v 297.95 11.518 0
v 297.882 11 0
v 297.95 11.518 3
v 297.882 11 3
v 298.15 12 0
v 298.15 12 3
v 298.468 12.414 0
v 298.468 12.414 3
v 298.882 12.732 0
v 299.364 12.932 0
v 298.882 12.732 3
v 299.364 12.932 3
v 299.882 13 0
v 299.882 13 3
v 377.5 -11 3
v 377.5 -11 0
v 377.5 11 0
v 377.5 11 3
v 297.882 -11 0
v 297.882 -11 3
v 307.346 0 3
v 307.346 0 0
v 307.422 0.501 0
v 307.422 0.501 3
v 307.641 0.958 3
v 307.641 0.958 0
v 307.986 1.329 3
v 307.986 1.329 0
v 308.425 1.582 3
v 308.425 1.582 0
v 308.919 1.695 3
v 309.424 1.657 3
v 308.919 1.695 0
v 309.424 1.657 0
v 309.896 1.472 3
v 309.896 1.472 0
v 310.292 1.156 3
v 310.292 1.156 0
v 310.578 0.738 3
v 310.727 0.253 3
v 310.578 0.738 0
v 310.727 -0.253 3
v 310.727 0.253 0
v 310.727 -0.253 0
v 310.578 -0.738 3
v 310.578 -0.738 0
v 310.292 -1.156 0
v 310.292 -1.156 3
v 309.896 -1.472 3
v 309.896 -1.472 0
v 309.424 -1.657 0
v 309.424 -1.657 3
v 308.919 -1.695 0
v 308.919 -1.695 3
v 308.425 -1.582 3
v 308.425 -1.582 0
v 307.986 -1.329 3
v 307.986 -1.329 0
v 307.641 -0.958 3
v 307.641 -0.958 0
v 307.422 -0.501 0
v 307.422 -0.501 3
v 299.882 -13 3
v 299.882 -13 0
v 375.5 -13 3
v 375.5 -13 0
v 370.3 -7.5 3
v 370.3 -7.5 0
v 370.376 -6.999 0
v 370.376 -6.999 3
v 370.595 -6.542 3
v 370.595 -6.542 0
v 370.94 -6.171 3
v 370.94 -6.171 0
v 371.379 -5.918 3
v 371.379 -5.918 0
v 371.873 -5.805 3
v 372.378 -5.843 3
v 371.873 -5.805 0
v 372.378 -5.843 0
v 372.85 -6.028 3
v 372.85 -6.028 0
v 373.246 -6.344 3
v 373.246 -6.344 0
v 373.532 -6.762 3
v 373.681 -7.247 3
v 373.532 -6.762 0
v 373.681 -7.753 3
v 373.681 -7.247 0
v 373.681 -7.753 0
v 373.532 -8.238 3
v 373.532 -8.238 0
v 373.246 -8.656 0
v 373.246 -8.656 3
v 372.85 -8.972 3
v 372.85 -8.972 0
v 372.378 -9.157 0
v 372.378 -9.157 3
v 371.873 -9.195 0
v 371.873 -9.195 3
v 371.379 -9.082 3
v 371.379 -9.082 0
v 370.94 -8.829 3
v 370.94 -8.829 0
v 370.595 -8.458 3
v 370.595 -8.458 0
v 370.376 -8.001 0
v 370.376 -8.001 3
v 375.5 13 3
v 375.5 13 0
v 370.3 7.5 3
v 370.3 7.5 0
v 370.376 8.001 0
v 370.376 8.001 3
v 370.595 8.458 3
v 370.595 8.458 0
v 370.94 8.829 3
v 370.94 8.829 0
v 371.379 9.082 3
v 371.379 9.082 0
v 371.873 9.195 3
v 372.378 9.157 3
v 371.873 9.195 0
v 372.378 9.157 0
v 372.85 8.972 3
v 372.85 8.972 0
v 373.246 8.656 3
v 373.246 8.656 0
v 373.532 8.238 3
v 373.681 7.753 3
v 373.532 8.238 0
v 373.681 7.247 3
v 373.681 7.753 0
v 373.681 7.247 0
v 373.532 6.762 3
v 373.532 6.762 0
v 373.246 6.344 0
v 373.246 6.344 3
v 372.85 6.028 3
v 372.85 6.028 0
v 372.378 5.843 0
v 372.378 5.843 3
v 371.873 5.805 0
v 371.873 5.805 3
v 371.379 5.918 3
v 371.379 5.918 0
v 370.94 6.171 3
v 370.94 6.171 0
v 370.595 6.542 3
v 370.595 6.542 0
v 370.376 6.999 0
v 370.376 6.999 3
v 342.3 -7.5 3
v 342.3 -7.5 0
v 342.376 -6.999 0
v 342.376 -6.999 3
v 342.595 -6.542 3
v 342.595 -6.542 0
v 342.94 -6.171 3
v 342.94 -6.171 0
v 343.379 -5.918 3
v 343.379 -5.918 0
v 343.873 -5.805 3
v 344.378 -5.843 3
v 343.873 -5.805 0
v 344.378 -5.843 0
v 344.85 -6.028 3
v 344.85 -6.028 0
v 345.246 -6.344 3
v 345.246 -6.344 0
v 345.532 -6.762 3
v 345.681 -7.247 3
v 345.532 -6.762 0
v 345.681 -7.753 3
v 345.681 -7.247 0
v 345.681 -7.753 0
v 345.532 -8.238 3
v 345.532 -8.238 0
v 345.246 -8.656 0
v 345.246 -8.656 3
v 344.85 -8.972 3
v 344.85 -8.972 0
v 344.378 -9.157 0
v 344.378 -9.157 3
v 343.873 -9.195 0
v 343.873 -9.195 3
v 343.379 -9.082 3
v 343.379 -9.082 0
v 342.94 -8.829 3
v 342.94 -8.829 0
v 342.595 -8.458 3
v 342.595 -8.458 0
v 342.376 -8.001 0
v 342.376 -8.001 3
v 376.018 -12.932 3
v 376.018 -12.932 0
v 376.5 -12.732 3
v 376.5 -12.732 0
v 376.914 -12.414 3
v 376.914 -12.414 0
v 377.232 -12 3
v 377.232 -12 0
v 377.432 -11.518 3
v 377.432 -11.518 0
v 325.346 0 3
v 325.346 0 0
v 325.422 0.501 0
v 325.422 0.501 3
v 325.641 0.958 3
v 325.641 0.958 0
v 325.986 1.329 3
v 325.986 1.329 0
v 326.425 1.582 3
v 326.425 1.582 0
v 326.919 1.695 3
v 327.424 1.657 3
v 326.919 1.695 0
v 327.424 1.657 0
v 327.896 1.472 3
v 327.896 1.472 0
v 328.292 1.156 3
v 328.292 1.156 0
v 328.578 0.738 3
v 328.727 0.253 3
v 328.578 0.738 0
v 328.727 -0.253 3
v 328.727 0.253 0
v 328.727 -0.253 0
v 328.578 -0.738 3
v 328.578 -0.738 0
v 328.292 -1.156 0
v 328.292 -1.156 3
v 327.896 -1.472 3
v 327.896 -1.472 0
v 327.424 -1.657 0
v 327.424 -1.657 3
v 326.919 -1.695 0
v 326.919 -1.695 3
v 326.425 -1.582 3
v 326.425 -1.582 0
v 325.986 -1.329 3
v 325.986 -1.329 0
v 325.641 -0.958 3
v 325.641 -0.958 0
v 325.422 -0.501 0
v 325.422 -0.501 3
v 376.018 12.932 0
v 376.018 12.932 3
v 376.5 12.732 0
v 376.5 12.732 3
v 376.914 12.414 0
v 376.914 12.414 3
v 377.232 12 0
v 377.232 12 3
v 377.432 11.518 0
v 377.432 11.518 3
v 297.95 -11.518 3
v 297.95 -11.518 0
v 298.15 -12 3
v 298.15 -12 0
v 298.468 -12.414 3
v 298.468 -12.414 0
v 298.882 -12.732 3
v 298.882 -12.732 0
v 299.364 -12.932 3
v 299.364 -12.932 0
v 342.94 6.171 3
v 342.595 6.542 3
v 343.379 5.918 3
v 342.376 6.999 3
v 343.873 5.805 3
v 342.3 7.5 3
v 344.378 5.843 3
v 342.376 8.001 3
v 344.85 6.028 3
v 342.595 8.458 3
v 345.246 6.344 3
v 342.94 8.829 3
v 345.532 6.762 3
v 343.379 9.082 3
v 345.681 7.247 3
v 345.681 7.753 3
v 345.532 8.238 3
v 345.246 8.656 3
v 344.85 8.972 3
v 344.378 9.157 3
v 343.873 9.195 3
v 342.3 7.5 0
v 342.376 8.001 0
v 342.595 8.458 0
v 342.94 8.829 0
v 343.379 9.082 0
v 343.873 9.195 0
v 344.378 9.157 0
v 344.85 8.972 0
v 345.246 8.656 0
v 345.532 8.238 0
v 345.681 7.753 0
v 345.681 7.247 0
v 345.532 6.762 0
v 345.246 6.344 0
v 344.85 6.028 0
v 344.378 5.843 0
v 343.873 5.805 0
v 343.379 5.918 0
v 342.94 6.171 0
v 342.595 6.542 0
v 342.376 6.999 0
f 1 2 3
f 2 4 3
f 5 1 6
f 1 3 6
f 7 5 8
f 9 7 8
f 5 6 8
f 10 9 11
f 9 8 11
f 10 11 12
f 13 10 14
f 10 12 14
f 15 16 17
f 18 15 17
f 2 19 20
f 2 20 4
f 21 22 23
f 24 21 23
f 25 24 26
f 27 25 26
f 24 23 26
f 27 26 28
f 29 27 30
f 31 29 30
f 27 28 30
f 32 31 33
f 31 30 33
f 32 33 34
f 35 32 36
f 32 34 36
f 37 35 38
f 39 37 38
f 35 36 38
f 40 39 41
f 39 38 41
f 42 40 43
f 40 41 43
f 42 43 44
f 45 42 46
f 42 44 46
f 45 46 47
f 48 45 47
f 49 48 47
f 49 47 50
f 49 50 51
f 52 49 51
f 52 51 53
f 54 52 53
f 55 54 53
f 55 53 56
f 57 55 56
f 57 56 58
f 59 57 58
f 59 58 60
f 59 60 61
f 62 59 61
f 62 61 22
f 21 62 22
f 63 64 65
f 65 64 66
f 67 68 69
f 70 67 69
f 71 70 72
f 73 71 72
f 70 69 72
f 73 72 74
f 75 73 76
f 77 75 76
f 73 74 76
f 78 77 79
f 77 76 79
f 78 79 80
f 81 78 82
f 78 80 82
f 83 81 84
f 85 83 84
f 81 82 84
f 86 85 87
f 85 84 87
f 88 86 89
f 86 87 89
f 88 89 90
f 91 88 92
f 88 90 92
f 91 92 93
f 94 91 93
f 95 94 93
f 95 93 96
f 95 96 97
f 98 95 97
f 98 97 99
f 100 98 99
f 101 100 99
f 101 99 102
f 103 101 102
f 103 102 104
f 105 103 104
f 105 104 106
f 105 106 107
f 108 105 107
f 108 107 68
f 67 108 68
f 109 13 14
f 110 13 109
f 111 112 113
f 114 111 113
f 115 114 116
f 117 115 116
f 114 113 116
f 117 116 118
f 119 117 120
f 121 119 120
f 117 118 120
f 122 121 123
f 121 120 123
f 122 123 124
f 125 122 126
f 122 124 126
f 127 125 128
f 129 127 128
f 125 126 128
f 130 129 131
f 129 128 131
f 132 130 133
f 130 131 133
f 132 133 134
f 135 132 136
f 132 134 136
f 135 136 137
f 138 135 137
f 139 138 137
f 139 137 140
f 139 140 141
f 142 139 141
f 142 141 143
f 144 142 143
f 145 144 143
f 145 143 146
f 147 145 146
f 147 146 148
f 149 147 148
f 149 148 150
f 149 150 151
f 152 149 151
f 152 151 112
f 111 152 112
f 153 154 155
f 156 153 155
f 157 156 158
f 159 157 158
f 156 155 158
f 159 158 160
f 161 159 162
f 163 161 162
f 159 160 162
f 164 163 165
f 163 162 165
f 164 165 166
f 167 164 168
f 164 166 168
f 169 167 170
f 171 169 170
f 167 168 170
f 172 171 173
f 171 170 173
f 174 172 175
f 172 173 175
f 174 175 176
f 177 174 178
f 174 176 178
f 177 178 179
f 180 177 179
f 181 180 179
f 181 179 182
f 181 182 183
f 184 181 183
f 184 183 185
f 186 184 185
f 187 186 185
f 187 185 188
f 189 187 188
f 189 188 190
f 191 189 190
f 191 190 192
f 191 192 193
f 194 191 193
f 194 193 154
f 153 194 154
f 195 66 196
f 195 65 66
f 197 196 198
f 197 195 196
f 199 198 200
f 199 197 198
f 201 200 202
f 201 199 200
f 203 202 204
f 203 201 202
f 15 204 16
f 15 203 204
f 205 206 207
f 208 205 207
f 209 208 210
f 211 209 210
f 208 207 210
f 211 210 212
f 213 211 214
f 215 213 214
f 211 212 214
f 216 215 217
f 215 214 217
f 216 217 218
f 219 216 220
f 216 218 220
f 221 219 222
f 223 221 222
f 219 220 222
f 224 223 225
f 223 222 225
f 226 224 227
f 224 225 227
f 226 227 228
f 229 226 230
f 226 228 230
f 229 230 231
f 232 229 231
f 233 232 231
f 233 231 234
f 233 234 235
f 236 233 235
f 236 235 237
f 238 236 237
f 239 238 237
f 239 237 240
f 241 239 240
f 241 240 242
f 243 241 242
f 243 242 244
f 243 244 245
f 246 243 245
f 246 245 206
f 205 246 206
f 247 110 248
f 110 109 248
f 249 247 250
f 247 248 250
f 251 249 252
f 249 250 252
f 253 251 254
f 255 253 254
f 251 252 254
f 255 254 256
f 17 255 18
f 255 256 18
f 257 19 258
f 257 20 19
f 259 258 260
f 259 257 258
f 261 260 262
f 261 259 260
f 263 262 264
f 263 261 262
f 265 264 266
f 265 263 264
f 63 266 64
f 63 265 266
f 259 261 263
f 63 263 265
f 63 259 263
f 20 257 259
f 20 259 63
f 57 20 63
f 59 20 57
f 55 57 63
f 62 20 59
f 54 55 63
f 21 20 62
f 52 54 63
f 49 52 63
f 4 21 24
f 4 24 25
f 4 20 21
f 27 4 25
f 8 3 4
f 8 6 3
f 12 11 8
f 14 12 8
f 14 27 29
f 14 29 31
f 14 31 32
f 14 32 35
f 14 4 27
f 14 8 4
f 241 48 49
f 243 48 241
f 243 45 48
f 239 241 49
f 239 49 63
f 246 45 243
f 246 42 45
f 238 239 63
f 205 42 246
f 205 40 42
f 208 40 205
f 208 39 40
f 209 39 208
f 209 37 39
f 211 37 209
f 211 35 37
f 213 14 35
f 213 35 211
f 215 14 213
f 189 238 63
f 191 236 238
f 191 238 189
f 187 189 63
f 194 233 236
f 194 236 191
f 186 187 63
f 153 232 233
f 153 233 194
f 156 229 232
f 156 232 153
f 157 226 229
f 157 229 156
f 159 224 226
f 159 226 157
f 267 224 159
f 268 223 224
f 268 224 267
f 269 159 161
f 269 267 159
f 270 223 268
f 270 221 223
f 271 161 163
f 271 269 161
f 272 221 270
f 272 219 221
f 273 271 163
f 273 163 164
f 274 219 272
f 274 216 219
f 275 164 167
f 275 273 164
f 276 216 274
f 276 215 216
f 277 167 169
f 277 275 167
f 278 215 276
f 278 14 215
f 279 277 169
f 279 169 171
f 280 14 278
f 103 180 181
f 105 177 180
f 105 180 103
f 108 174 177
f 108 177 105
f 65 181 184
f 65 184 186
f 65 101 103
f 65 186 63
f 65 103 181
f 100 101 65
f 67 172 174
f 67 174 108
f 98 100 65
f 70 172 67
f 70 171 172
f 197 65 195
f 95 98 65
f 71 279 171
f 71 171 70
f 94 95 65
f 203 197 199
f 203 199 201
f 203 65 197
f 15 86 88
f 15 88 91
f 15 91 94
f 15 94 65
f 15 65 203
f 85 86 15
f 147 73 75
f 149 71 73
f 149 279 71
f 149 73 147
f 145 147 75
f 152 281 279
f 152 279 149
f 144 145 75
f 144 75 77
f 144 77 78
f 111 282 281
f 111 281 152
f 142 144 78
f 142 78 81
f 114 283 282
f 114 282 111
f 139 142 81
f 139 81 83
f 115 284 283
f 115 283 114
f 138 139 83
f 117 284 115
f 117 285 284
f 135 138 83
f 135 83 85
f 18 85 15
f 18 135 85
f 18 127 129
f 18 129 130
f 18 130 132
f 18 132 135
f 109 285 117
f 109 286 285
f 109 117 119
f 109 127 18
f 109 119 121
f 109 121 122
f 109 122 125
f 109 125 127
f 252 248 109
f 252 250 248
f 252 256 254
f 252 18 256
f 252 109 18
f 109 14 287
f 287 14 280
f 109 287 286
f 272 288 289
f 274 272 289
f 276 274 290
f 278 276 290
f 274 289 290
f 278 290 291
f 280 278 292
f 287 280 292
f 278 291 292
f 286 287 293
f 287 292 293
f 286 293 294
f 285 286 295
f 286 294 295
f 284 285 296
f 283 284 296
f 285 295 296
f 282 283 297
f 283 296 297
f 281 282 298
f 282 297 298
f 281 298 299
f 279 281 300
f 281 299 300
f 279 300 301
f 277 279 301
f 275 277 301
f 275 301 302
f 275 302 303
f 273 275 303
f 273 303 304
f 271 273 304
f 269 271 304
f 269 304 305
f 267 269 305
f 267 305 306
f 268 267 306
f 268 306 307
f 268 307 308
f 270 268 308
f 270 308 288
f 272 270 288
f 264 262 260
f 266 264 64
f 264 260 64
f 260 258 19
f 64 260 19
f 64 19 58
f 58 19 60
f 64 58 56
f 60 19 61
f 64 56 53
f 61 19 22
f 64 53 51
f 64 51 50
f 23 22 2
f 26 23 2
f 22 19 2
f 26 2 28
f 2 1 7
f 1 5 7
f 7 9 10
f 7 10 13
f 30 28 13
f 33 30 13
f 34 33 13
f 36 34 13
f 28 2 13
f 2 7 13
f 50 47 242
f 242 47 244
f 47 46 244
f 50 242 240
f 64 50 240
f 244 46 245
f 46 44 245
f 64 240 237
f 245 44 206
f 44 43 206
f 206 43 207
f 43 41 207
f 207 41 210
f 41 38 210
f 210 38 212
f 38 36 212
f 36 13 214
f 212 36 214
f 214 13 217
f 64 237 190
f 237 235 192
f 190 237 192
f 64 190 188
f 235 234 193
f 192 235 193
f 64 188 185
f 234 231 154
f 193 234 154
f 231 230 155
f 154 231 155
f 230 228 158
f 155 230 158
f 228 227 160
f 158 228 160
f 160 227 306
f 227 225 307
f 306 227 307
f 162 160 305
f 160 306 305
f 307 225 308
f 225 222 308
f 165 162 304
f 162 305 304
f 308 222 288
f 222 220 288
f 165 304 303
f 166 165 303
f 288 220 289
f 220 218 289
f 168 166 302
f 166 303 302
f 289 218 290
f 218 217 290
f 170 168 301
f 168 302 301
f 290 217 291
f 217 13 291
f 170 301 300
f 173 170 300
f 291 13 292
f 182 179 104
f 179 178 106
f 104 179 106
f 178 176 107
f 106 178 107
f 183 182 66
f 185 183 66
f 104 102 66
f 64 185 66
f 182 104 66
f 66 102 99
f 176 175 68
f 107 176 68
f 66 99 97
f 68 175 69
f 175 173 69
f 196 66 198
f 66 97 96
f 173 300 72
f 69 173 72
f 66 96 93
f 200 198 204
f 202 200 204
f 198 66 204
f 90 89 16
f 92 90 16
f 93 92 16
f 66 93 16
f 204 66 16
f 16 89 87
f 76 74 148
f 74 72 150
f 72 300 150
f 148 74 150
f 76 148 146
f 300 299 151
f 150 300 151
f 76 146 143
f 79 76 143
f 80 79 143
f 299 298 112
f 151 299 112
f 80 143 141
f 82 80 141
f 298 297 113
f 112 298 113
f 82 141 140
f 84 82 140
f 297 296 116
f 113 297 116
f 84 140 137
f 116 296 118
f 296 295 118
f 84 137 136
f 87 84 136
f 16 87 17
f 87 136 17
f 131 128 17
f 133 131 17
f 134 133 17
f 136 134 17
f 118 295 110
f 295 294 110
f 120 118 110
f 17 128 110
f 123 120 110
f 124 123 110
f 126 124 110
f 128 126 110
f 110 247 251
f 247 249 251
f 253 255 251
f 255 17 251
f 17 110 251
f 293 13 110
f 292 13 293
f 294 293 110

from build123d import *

# Parameters (mm, degrees)
SKETCH1_W                = 79.618258269
SKETCH1_H                = 26
BOSS_EXTRUDE1_DEPTH      = 3
M3_CLEARANCE_HOLE1_D     = 3.4
M3_CLEARANCE_HOLE1_DEPTH = 5
M3_CLEARANCE_HOLE1_TIP   = 1.021463052
M3_CLEARANCE_HOLE2_D     = 3.4
M3_CLEARANCE_HOLE2_DEPTH = 5
M3_CLEARANCE_HOLE2_TIP   = 1.021463052
FILLET1_R                = 2


with BuildPart() as part:
    # Sketch1 → Boss-Extrude1 (new body)
    with BuildSketch(Plane.XY):
        with Locations((337.690870866, 0)):
            Rectangle(SKETCH1_W, SKETCH1_H)
    extrude(amount=BOSS_EXTRUDE1_DEPTH)

    # M3 Clearance Hole1
    with Locations(Plane.XY.offset(3)):
        with Locations((372, -7.5), (372, 7.5), (344, 7.5), (344, -7.5)):
            Hole(M3_CLEARANCE_HOLE1_D / 2, depth=M3_CLEARANCE_HOLE1_DEPTH)
            with Locations((0, 0, -(M3_CLEARANCE_HOLE1_DEPTH + M3_CLEARANCE_HOLE1_TIP / 2))):  # 118° drill point
                Cone(0, M3_CLEARANCE_HOLE1_D / 2, M3_CLEARANCE_HOLE1_TIP, mode=Mode.SUBTRACT)

    # M3 Clearance Hole2
    with Locations(Plane.XY.offset(3)):
        with Locations((309.046054969, 0), (327.046054969, 0)):
            Hole(M3_CLEARANCE_HOLE2_D / 2, depth=M3_CLEARANCE_HOLE2_DEPTH)
            with Locations((0, 0, -(M3_CLEARANCE_HOLE2_DEPTH + M3_CLEARANCE_HOLE2_TIP / 2))):  # 118° drill point
                Cone(0, M3_CLEARANCE_HOLE2_D / 2, M3_CLEARANCE_HOLE2_TIP, mode=Mode.SUBTRACT)

    # Fillet1
    fillet1_edges = [part.edges().sort_by_distance(p)[0] for p in [
        (297.881741731, 13, 1.5),
        (377.5, 13, 1.5),
        (377.5, -13, 1.5),
        (297.881741731, -13, 1.5),
    ]]
    fillet(fillet1_edges, radius=FILLET1_R)


solid = part.part
